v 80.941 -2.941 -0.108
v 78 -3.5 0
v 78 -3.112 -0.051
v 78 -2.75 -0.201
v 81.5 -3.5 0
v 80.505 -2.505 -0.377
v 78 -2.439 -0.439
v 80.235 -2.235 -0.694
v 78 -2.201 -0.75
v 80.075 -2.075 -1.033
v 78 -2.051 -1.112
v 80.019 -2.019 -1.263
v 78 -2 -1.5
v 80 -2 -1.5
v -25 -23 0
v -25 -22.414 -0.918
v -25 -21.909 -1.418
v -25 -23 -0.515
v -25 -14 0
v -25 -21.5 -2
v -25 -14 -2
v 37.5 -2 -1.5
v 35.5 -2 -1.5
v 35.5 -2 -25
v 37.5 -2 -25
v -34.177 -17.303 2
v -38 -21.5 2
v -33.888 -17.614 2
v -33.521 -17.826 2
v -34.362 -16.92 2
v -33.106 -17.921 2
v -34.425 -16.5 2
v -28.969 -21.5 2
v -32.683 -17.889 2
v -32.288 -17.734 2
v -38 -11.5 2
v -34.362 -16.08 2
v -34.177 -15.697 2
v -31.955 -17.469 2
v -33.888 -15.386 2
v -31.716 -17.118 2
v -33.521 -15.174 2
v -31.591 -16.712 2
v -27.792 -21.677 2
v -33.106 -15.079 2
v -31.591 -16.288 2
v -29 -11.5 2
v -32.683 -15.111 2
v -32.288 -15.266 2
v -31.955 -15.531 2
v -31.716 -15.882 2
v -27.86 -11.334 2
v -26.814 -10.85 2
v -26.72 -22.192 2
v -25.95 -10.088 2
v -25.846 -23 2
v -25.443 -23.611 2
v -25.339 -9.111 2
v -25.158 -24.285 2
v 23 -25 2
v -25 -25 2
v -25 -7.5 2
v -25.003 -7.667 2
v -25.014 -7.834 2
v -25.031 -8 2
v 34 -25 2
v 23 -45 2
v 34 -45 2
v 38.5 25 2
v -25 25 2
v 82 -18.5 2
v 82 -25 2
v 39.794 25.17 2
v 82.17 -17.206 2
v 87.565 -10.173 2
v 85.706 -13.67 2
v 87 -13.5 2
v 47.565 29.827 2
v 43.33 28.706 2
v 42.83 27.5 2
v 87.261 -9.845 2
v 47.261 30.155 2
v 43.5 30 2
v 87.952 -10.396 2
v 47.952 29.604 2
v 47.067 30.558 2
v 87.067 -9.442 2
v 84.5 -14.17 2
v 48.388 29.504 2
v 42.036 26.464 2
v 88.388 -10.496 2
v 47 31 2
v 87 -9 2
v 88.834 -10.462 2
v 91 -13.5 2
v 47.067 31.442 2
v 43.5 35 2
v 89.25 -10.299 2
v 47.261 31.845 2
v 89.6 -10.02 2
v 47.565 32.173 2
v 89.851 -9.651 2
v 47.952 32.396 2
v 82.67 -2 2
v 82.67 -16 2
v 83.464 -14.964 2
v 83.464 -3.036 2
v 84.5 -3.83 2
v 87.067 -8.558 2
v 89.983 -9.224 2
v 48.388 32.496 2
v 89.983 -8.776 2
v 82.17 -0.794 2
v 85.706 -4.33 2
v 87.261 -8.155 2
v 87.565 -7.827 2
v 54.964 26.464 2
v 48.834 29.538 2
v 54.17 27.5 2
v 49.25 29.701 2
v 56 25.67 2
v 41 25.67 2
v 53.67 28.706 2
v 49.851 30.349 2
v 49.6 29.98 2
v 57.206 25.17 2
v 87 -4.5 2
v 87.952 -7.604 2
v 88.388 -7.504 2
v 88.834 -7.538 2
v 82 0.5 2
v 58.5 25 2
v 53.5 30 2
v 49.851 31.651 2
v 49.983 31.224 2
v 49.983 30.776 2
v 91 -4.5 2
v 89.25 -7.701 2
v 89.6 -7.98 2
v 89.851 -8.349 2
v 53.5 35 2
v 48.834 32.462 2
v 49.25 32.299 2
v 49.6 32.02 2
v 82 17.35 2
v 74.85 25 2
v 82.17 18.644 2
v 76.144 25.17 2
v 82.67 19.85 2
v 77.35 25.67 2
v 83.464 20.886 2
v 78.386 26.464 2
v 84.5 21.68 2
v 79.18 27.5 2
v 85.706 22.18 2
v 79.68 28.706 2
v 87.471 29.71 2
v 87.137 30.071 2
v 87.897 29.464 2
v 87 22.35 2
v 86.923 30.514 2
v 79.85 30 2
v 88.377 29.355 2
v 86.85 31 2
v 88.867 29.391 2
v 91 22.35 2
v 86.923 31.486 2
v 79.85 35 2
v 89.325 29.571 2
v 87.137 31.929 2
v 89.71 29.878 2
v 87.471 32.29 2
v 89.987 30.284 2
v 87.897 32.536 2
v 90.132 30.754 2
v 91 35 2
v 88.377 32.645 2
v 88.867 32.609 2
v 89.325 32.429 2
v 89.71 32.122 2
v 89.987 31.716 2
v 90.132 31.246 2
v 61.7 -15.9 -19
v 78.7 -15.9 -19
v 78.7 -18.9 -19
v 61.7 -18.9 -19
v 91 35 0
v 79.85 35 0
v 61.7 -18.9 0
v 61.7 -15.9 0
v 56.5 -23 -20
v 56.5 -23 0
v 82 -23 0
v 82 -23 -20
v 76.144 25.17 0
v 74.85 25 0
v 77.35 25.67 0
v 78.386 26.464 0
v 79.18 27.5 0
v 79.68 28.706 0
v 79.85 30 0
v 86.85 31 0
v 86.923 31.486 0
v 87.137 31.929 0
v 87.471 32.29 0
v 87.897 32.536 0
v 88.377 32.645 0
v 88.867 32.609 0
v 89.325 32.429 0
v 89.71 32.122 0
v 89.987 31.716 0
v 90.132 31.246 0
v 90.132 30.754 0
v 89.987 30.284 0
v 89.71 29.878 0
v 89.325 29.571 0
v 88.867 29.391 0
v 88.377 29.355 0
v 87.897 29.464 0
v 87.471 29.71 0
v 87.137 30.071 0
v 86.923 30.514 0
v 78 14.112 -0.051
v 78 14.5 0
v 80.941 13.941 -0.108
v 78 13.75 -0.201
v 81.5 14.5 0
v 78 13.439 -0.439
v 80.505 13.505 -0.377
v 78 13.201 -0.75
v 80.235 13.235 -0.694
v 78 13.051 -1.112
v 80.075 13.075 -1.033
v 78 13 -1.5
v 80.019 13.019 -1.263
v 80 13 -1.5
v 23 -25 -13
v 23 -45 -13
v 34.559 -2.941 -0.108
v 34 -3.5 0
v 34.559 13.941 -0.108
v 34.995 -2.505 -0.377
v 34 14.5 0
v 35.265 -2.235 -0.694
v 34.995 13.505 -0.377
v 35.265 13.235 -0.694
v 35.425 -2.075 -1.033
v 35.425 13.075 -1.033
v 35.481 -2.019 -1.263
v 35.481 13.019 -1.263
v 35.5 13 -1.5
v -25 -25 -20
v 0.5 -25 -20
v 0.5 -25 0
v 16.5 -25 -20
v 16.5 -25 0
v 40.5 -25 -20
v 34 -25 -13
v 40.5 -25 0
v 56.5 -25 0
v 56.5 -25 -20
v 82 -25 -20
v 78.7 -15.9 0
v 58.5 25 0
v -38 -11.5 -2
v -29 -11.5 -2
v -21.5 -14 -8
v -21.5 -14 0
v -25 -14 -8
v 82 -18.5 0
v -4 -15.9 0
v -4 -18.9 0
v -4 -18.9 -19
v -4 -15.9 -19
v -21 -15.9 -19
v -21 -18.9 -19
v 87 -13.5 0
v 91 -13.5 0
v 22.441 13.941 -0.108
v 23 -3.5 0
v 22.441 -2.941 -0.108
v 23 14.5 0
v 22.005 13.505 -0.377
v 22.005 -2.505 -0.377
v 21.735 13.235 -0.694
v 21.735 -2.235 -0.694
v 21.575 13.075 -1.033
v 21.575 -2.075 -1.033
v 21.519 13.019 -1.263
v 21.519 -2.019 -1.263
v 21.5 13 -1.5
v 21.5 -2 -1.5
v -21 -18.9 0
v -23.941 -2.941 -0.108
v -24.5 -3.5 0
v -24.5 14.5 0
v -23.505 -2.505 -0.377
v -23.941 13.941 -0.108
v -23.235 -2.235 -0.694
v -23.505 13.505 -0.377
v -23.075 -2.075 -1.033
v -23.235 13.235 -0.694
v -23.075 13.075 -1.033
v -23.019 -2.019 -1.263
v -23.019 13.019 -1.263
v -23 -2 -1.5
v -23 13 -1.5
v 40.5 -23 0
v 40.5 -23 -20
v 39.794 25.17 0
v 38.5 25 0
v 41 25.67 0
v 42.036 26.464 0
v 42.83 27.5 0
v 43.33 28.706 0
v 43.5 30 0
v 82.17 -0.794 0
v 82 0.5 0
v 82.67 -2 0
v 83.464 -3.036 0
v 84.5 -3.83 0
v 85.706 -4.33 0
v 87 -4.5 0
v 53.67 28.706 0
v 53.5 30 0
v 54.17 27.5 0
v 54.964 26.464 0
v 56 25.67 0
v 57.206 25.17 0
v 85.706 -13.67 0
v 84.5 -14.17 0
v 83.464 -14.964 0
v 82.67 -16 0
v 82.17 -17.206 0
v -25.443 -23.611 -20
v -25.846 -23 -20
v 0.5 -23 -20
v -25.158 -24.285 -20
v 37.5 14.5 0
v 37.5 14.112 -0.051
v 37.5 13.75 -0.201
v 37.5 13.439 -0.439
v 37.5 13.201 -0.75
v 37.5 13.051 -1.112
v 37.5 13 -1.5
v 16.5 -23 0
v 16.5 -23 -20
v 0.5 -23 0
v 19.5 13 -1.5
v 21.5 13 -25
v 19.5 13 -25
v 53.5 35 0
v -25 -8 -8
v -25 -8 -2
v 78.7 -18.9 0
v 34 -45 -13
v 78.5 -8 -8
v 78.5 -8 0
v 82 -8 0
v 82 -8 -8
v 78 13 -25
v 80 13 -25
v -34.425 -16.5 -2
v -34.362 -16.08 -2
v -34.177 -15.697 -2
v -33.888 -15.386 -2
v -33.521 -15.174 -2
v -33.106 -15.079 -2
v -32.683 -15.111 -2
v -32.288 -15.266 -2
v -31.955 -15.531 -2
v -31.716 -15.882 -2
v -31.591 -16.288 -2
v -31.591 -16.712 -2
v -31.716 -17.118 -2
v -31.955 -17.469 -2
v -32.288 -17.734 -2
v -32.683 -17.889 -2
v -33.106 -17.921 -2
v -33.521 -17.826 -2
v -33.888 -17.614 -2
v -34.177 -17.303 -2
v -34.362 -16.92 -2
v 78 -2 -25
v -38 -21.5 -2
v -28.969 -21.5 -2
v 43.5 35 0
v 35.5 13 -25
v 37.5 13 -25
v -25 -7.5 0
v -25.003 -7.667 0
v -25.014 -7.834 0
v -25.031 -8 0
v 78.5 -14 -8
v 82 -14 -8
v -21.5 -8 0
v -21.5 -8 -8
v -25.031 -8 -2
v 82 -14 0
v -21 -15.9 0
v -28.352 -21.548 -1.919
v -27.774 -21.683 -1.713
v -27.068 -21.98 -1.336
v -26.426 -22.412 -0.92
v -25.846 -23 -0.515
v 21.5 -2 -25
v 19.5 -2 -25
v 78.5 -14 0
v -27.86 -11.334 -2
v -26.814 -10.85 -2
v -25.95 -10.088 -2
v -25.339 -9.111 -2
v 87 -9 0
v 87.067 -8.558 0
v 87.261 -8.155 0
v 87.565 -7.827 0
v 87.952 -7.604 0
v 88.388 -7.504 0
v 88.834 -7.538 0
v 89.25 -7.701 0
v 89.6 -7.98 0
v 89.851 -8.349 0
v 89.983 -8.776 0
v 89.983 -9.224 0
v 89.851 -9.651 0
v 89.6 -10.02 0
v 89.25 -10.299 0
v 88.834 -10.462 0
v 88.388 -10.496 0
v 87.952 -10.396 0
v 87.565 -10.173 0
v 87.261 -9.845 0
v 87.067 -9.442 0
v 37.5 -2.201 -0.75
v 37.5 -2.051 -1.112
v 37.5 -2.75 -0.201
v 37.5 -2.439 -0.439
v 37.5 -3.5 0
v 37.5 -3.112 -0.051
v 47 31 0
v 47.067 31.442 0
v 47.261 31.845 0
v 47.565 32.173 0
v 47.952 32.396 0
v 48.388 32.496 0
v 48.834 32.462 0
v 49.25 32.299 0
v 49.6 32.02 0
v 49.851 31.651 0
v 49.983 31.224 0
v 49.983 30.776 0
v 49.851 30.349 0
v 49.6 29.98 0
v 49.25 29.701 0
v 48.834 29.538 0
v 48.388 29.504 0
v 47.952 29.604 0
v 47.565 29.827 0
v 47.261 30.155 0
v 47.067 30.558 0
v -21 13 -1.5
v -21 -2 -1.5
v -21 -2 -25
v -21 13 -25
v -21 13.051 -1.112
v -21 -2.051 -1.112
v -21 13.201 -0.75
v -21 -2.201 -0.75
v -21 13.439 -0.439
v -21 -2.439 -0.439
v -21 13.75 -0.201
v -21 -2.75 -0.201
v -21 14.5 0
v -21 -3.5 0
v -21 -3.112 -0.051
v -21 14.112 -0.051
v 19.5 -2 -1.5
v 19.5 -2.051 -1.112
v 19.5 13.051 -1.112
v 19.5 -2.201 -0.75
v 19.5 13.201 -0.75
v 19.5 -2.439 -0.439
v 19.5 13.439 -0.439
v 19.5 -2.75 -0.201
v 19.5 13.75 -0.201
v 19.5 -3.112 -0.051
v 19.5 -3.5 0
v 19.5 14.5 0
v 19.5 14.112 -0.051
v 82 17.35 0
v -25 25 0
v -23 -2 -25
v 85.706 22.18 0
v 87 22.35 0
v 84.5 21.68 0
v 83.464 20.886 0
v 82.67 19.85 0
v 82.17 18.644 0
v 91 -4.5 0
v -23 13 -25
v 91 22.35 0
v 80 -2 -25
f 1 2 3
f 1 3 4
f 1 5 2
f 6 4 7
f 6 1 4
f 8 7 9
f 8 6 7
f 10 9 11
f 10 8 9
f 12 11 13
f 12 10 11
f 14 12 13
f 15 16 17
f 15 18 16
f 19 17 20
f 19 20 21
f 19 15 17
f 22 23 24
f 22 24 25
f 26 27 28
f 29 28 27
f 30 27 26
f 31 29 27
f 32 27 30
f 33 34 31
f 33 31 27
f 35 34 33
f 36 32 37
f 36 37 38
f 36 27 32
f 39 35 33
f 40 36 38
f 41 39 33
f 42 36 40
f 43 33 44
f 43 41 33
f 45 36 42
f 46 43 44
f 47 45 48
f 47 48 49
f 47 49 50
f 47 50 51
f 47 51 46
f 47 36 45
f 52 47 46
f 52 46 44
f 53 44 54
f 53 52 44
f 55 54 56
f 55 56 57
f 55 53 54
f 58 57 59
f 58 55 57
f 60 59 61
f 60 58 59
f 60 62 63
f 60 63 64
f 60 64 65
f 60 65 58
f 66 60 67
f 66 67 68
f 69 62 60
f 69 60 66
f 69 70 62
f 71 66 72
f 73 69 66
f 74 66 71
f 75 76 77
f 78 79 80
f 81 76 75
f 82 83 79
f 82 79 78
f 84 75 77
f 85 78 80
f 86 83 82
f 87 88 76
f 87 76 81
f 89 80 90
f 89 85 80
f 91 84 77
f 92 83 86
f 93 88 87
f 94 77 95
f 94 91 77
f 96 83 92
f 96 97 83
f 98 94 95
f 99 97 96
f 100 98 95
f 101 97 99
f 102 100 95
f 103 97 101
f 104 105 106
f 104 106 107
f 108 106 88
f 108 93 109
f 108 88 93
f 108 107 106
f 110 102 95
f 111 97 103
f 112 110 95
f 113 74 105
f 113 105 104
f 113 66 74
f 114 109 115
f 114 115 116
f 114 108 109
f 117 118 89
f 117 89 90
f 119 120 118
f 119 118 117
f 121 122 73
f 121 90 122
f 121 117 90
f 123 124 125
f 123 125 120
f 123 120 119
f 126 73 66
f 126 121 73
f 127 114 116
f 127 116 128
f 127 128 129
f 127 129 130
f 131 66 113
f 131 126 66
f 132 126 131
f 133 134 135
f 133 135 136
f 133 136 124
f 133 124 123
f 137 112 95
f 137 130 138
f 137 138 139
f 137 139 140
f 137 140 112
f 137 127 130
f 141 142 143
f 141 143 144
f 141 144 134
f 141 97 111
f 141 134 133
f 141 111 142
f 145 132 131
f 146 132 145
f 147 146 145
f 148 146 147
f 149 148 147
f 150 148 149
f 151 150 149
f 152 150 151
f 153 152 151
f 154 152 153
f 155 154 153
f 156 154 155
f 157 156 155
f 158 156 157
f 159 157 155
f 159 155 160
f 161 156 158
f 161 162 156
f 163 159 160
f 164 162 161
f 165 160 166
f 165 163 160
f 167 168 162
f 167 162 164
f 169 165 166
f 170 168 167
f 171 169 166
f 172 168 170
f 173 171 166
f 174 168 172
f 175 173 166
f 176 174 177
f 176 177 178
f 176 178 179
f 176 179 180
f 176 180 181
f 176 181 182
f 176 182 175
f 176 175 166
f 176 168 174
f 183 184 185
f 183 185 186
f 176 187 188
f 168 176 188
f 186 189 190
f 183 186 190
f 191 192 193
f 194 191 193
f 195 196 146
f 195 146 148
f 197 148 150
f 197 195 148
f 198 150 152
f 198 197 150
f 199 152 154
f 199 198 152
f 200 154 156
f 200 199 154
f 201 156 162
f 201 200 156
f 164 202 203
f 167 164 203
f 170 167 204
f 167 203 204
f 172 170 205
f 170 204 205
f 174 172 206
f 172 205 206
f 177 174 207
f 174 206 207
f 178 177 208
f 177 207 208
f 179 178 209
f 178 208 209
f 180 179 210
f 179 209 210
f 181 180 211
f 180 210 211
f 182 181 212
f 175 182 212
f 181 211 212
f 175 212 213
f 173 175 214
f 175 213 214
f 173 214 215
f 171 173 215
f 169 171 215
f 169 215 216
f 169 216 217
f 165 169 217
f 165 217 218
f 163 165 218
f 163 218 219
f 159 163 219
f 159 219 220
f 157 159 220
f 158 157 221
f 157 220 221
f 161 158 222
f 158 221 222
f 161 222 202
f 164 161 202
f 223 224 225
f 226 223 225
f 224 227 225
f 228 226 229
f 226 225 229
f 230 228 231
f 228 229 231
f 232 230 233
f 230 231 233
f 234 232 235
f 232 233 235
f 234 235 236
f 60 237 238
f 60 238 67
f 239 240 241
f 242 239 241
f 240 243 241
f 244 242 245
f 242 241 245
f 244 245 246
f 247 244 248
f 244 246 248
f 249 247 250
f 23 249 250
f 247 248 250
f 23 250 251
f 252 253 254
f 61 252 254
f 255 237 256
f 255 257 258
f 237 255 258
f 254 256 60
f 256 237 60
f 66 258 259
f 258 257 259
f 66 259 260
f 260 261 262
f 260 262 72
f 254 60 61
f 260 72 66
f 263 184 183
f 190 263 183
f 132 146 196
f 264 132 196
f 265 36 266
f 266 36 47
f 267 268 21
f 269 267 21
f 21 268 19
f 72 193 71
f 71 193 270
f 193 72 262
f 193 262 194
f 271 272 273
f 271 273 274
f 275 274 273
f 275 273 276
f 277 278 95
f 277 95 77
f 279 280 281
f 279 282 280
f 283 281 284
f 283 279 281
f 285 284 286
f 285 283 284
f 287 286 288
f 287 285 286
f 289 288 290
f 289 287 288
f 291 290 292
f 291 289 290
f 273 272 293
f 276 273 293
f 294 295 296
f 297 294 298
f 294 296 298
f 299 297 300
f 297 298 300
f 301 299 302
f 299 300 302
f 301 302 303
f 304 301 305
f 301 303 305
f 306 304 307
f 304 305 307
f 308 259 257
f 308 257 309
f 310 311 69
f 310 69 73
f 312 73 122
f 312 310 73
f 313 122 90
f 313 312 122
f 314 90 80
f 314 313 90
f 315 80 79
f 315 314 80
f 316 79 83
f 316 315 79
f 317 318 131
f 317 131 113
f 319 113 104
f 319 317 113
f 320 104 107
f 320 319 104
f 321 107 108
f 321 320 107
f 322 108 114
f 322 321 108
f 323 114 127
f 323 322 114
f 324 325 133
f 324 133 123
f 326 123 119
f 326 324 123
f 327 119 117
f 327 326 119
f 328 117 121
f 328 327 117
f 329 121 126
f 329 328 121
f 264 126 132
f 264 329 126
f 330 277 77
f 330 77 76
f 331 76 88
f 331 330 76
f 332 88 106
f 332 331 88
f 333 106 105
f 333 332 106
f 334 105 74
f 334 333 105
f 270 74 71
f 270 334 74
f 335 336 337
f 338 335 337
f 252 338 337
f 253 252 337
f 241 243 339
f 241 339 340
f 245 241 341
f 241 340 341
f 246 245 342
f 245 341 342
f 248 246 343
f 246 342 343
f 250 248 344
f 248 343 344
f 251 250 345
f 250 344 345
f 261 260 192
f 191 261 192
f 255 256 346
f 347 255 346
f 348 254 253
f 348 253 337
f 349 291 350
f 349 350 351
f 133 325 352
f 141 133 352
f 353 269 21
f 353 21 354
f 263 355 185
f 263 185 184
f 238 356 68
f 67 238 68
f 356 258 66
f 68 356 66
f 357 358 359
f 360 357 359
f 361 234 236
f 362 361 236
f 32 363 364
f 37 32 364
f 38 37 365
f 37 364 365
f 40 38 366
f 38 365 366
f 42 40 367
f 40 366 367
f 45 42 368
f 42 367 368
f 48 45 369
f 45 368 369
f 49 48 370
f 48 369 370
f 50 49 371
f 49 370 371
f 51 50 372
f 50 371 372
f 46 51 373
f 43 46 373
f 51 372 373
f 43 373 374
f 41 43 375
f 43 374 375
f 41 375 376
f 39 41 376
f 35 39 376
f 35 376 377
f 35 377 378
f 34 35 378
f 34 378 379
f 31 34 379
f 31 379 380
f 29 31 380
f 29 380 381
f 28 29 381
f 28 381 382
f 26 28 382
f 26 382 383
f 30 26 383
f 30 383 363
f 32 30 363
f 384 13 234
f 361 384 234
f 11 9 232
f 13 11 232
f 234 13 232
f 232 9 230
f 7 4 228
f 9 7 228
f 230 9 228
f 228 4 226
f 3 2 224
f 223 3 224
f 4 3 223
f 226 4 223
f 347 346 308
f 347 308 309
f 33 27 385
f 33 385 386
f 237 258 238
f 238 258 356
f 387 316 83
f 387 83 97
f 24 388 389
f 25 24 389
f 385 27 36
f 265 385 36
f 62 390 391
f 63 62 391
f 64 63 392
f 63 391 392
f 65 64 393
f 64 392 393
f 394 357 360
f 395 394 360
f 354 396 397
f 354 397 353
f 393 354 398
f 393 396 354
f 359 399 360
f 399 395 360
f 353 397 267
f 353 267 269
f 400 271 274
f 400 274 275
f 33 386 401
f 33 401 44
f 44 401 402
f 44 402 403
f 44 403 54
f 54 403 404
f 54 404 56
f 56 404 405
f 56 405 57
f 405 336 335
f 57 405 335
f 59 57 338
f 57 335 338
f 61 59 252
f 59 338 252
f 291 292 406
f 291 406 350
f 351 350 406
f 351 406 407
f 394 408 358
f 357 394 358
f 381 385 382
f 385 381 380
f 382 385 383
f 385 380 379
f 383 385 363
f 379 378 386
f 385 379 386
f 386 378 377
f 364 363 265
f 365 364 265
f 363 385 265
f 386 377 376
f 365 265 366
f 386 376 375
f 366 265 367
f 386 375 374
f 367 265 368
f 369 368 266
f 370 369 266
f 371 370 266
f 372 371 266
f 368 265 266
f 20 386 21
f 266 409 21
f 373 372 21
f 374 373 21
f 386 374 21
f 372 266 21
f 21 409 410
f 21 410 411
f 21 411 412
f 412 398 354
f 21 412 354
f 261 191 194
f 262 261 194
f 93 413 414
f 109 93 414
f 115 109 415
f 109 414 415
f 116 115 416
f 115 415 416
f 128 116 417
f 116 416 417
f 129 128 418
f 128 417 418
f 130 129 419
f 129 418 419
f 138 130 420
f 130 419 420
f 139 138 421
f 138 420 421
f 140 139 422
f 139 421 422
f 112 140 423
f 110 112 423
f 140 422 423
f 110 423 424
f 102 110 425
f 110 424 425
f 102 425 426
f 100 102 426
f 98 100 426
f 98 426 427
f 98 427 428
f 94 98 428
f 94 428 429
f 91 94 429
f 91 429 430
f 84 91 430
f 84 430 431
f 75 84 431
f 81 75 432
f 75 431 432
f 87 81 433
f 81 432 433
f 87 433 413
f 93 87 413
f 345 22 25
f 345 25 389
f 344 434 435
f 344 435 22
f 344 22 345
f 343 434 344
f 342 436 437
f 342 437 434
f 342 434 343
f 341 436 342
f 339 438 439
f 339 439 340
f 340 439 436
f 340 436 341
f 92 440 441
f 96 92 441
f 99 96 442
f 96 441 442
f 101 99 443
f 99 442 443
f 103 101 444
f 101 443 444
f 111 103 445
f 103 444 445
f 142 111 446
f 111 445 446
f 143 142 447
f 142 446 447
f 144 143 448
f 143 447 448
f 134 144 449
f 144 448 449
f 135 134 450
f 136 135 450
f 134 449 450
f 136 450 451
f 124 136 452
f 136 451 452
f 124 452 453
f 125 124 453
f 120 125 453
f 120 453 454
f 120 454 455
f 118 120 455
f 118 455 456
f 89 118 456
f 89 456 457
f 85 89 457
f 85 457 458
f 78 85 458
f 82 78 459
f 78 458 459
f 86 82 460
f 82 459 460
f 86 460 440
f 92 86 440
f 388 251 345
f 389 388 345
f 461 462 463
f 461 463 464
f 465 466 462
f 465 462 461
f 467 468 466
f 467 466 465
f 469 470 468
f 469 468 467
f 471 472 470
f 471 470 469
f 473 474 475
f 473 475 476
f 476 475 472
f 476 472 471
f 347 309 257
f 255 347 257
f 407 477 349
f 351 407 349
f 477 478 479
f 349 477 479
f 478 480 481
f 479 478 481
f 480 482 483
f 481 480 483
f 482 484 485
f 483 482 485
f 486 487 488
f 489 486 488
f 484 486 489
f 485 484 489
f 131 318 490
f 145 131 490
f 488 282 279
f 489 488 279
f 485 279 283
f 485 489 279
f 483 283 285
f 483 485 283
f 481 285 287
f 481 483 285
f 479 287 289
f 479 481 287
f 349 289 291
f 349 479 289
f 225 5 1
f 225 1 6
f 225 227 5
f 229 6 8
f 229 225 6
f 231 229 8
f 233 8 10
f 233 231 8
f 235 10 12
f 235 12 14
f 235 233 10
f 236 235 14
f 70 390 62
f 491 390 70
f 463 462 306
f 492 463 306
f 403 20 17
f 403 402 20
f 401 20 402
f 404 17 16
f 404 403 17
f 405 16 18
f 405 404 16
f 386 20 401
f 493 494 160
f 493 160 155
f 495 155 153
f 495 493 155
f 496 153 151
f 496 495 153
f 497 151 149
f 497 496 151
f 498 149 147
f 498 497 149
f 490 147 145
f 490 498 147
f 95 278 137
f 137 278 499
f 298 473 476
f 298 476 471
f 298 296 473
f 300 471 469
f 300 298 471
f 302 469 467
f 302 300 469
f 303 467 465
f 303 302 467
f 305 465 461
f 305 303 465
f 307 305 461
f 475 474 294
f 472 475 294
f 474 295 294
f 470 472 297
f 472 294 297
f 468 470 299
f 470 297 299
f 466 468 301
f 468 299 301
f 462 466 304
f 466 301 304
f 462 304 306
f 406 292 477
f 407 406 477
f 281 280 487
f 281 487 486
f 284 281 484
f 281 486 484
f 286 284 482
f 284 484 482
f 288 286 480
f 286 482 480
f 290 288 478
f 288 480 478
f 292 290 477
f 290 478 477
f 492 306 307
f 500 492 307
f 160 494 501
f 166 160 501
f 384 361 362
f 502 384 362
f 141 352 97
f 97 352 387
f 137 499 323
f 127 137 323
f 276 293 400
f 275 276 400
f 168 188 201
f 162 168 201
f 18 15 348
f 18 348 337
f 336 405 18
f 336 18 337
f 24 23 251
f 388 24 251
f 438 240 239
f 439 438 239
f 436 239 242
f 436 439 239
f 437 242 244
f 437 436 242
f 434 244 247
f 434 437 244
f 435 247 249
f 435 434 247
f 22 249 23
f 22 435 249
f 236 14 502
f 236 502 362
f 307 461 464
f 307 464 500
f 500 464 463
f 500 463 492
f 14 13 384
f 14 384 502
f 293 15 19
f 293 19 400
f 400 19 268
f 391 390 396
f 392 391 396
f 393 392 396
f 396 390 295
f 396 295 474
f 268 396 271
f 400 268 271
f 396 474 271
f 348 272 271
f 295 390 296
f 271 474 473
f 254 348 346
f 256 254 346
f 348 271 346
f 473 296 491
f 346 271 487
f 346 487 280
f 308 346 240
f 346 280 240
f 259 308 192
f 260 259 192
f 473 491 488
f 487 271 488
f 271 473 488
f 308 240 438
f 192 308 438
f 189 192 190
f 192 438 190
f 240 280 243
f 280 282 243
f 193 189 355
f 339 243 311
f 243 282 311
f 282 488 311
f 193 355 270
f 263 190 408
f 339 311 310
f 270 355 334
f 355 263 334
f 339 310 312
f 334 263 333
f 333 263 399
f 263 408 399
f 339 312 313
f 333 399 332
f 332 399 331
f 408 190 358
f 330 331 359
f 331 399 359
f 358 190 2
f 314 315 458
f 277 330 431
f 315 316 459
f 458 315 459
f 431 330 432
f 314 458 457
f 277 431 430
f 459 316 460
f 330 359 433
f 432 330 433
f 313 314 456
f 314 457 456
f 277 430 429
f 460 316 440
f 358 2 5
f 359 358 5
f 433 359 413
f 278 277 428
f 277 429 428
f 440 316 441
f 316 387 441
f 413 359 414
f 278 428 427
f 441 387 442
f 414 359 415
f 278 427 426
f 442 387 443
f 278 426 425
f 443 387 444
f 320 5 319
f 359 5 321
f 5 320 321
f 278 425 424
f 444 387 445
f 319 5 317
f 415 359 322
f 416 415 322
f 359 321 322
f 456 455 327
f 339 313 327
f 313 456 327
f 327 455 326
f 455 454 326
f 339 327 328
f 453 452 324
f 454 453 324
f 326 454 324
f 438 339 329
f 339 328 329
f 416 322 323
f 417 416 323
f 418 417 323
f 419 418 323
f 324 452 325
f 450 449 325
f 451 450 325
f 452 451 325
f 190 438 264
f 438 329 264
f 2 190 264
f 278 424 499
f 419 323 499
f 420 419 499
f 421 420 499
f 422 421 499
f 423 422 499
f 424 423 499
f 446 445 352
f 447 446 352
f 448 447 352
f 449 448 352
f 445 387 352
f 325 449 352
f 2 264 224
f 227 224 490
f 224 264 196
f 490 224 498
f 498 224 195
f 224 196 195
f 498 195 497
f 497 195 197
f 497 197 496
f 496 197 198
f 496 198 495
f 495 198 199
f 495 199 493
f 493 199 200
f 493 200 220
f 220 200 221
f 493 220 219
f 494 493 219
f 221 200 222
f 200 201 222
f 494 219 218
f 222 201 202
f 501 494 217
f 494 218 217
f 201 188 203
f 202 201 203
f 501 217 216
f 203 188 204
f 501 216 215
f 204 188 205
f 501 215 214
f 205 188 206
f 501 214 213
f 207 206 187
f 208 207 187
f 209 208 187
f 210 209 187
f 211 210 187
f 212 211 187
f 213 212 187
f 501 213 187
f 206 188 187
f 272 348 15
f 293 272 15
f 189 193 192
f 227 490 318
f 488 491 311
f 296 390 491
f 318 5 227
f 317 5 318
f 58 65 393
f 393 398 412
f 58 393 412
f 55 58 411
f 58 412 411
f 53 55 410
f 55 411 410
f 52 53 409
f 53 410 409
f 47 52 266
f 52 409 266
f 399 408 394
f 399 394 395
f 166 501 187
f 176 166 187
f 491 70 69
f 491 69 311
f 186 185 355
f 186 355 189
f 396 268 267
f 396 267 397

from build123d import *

# Parameters (mm, degrees)
SKETCH1_W            = 50
SKETCH1_H            = 50
BOSS_EXTRUDE1_DEPTH  = 2
SKETCH2_W            = 8.5
SKETCH2_H            = 2
SKETCH2_W_2          = 25.5
BOSS_EXTRUDE2_DEPTH  = 20
SKETCH3_W            = 2
SKETCH3_H            = 15
BOSS_EXTRUDE3_DEPTH  = 20
SKETCH5_W            = 2
SKETCH5_H            = 15
BOSS_EXTRUDE5_DEPTH  = 25
SKETCH8_W            = 3.5
SKETCH8_H            = 6
BOSS_EXTRUDE7_DEPTH  = 8
BOSS_EXTRUDE8_DEPTH  = 3.5
SKETCH10_W           = 9
SKETCH10_H           = 9
SKETCH10_R           = 1.5
SKETCH10_R_2         = 1.65
SKETCH10_W_2         = 10
SKETCH10_H_2         = 10
BOSS_EXTRUDE9_DEPTH  = 2
FILLET1_R            = 5
SKETCH11_W           = 17
SKETCH11_H           = 3
BOSS_EXTRUDE10_DEPTH = 19
FILLET2_R            = 1.5
SKETCH12_W           = 13
SKETCH12_H           = 10
BOSS_EXTRUDE11_DEPTH = 4
FILLET3_START        = -2
FILLET3_DEPTH        = 4
FILLET3_START_2      = -20
FILLET3_2_DEPTH      = 18.41096
FILLET3_3_DEPTH      = 2
SKETCH13_R           = 1.425
CUT_EXTRUDE1_DEPTH   = 105.091306073
FILLET4_START        = -2.000000956
FILLET4_DEPTH        = 4.000000956
FILLET4_START_2      = -30
FILLET4_2_DEPTH      = 5


with BuildPart() as part:
    # Sketch1 → Boss-Extrude1 (new body)
    with BuildSketch(Plane.XY):
        Rectangle(SKETCH1_W, SKETCH1_H)
    extrude(amount=BOSS_EXTRUDE1_DEPTH)

    # Sketch2 → Boss-Extrude2 (add)
    with BuildSketch(Plane(origin=(0, 0, 0), x_dir=(-1, 0, 0), z_dir=(0, 0, -1))):
        with Locations((-20.75, -24)):
            Rectangle(SKETCH2_W, SKETCH2_H)
        with Locations((12.25, -24)):
            Rectangle(SKETCH2_W_2, SKETCH2_H)
    extrude(amount=BOSS_EXTRUDE2_DEPTH)

    # Sketch3 → Boss-Extrude3 (add)
    with BuildSketch(Plane.XZ.offset(25)):
        with Locations((24, -5.5)):
            Rectangle(SKETCH3_W, SKETCH3_H)
    extrude(amount=BOSS_EXTRUDE3_DEPTH)

    # Sketch5 → Boss-Extrude5 (add)
    with BuildSketch(Plane(origin=(0, 0, 0), x_dir=(-1, 0, 0), z_dir=(0, 0, -1))):
        with Locations((-20.5, 5.5)):
            Rectangle(SKETCH5_W, SKETCH5_H)
        with Locations((22, 5.5)):
            Rectangle(SKETCH5_W, SKETCH5_H)
    extrude(amount=BOSS_EXTRUDE5_DEPTH)

    # Sketch8 → Boss-Extrude7 (add)
    with BuildSketch(Plane(origin=(0, 0, 0), x_dir=(-1, 0, 0), z_dir=(0, 0, -1))):
        with Locations((23.25, -11)):
            Rectangle(SKETCH8_W, SKETCH8_H)
    extrude(amount=BOSS_EXTRUDE7_DEPTH)

    # Sketch9 → Boss-Extrude8 (add)
    with BuildSketch(Plane(origin=(25, 0, 0), x_dir=(0, 0, -1), z_dir=(1, 0, 0))):
        Polygon((-2, 25), (0, 25), (0, -23), (20, -23), (20, -25), (13, -25), (13, -45), (-2, -45), align=None)
    extrude(amount=BOSS_EXTRUDE8_DEPTH)

    # Mirror1: part across plane


with BuildPart() as part_1:
    add(part.part)
    add(part.part.mirror(Plane.ZY.offset(-28.5)))

    # Sketch10 → Boss-Extrude9 (add)
    # profile 1 of 3: a face of its own
    with BuildSketch(Plane(origin=(0, 0, 0), x_dir=(-1, 0, 0), z_dir=(0, 0, -1))):
        with Locations((-86.5, -9)):
            Rectangle(SKETCH10_W, SKETCH10_H)
        with Locations((-88.5, -9)):
            Circle(SKETCH10_R, mode=Mode.SUBTRACT)
    # profile 2 of 3: a face of its own
    with BuildSketch(Plane(origin=(0, 0, 0), x_dir=(-1, 0, 0), z_dir=(0, 0, -1))):
        Polygon((-79.85, 35), (-79.85, 25), (-82, 25), (-82, 22.35), (-91, 22.35), (-91, 35), align=None)
        with Locations((-88.5, 31)):
            Circle(SKETCH10_R_2, mode=Mode.SUBTRACT)
    # profile 3 of 3: a face of its own
    with BuildSketch(Plane(origin=(0, 0, 0), x_dir=(-1, 0, 0), z_dir=(0, 0, -1))):
        with Locations((-48.5, 30)):
            Rectangle(SKETCH10_W_2, SKETCH10_H_2)
        with Locations((-48.5, 31)):
            Circle(SKETCH10_R, mode=Mode.SUBTRACT)
    extrude(amount=-BOSS_EXTRUDE9_DEPTH)

    # Fillet1
    # the kernel refuses this fillet: 5 mm, written as the material it adds along each edge
    with BuildSketch(Plane(origin=(82, -4.5, 0), x_dir=(0, 1, 0), z_dir=(0, 0, 1)), Plane(origin=(79.85, 25, 0), x_dir=(-1, 0, 0), z_dir=(0, 0, 1)), Plane(origin=(43.5, 25, 0), x_dir=(-1, 0, 0), z_dir=(0, 0, 1))) as fillet1_piece_1:
        with BuildLine():
            CenterArc((FILLET1_R, -FILLET1_R), FILLET1_R, 90, 90)
            Line((0, -FILLET1_R), (0, 0))
            Line((0, 0), (FILLET1_R, 0))
        make_face()
    extrude(amount=2)
    with BuildSketch(Plane(origin=(82, -13.5, 0), x_dir=(0, -1, 0), z_dir=(0, 0, 1)), Plane(origin=(82, 22.35, 0), x_dir=(0, -1, 0), z_dir=(0, 0, 1)), Plane(origin=(53.5, 25, 0), x_dir=(1, 0, 0), z_dir=(0, 0, 1))) as fillet1_piece_2:
        with BuildLine():
            CenterArc((FILLET1_R, FILLET1_R), FILLET1_R, 180, 90)
            Line((0, FILLET1_R), (0, 0))
            Line((0, 0), (FILLET1_R, 0))
        make_face()
    extrude(amount=2)

    # Sketch11 → Boss-Extrude10 (add)
    with BuildSketch(Plane(origin=(0, 0, 0), x_dir=(-1, 0, 0), z_dir=(0, 0, -1))):
        with Locations((-70.2, -17.4)):
            Rectangle(SKETCH11_W, SKETCH11_H)
        with Locations((12.5, -17.4)):
            Rectangle(SKETCH11_W, SKETCH11_H)
    extrude(amount=BOSS_EXTRUDE10_DEPTH)

    # Fillet2
    fillet2_edges = [part_1.edges().sort_by_distance(p)[0] for p in [
        (79, 13, 0),
        (79, -2, 0),
        (80, 5.5, 0),
        (36.5, 13, 0),
        (35.5, 5.5, 0),
        (36.5, -2, 0),
        (20.5, 13, 0),
        (20.5, -2, 0),
        (21.5, 5.5, 0),
        (-22, 13, 0),
        (-23, 5.5, 0),
        (-22, -2, 0),
    ]]
    fillet(fillet2_edges, radius=FILLET2_R)

    # Sketch12 → Boss-Extrude11 (add)
    with BuildSketch(Plane.XY.offset(2)):
        with Locations((-31.5, -16.5)):
            Rectangle(SKETCH12_W, SKETCH12_H)
    extrude(amount=-BOSS_EXTRUDE11_DEPTH)

    # Fillet3: read off the stored shape, not the designer's step
    # Fillet3 outline → Fillet3 (add)
    with BuildSketch(Plane.XY.offset(FILLET3_START)):
        with BuildLine():
            ThreePointArc((-25.846127967, -23), (-25.284740857, -23.941480467), (-25, -25))
            Line((-25, -25), (-25, -23))
            Line((-25, -23), (-25.846127967, -23))
        make_face()
        with BuildLine():
            ThreePointArc((-25.031373033, -8), (-26.354248689, -10.5), (-29, -11.5))
            Line((-29, -11.5), (-25, -11.5))
            Line((-25, -11.5), (-25, -8))
            Line((-25, -8), (-25.031373033, -8))
        make_face()
    extrude(amount=FILLET3_DEPTH)

    # Fillet3 2 outline → Fillet3 2 (add)
    with BuildSketch(Plane.XY.offset(FILLET3_START_2)):
        with BuildLine():
            ThreePointArc((-25.846127967, -23), (-25.284740857, -23.941480467), (-25, -25))
            Line((-25, -25), (-25, -23))
            Line((-25, -23), (-25.846127967, -23))
        make_face()
    extrude(amount=FILLET3_2_DEPTH)

    # Fillet3 3 outline → Fillet3 3 (add)
    with BuildSketch(Plane.XY):
        with BuildLine():
            ThreePointArc((-28.968626967, -21.5), (-27.236576159, -21.894448725), (-25.846127967, -23))
            Line((-25.846127967, -23), (-25, -23))
            Line((-25, -23), (-25, -21.5))
            Line((-25, -21.5), (-28.968626967, -21.5))
        make_face()
        with BuildLine():
            ThreePointArc((-25, -7.5), (-25.007850963, -7.75049165), (-25.031373033, -8))
            Line((-25.031373033, -8), (-25, -8))
            Line((-25, -8), (-25, -7.5))
        make_face()
    extrude(amount=FILLET3_3_DEPTH)

    # Sketch13 → Cut-Extrude1 (cut, through all)
    with BuildSketch(Plane(origin=(0, 0, -2), x_dir=(-1, 0, 0), z_dir=(0, 0, -1))):
        with Locations((33, -16.5)):
            Circle(SKETCH13_R)
    extrude(amount=-CUT_EXTRUDE1_DEPTH, mode=Mode.SUBTRACT)

    # Fillet4: read off the stored shape, not the designer's step
    # Fillet4 outline → Fillet4 (add)
    with BuildSketch(Plane.XY.offset(FILLET4_START)):
        with BuildLine():
            Line((-25.846127967, -23), (-25, -23))
            Line((-25, -23), (-25, -21.5))
            Line((-25, -21.5), (-28.968626967, -21.5))
            ThreePointArc((-28.968626967, -21.5), (-27.236576159, -21.894448725), (-25.846127967, -23))
        make_face()
    extrude(amount=FILLET4_DEPTH)

    # Fillet4 2 outline → Fillet4 2 (cut)
    with BuildSketch(Plane.YZ.offset(FILLET4_START_2)):
        with BuildLine():
            ThreePointArc((-21.499991299, -2.000015071), (-22.150318116, -1.157004674), (-23, -0.515418986))
            Line((-23, -0.515418986), (-23, -2.000000956))
            Line((-23, -2.000000956), (-21.499991299, -2.000015071))
        make_face()
    extrude(amount=FILLET4_2_DEPTH, mode=Mode.SUBTRACT)


solid = part_1.part
